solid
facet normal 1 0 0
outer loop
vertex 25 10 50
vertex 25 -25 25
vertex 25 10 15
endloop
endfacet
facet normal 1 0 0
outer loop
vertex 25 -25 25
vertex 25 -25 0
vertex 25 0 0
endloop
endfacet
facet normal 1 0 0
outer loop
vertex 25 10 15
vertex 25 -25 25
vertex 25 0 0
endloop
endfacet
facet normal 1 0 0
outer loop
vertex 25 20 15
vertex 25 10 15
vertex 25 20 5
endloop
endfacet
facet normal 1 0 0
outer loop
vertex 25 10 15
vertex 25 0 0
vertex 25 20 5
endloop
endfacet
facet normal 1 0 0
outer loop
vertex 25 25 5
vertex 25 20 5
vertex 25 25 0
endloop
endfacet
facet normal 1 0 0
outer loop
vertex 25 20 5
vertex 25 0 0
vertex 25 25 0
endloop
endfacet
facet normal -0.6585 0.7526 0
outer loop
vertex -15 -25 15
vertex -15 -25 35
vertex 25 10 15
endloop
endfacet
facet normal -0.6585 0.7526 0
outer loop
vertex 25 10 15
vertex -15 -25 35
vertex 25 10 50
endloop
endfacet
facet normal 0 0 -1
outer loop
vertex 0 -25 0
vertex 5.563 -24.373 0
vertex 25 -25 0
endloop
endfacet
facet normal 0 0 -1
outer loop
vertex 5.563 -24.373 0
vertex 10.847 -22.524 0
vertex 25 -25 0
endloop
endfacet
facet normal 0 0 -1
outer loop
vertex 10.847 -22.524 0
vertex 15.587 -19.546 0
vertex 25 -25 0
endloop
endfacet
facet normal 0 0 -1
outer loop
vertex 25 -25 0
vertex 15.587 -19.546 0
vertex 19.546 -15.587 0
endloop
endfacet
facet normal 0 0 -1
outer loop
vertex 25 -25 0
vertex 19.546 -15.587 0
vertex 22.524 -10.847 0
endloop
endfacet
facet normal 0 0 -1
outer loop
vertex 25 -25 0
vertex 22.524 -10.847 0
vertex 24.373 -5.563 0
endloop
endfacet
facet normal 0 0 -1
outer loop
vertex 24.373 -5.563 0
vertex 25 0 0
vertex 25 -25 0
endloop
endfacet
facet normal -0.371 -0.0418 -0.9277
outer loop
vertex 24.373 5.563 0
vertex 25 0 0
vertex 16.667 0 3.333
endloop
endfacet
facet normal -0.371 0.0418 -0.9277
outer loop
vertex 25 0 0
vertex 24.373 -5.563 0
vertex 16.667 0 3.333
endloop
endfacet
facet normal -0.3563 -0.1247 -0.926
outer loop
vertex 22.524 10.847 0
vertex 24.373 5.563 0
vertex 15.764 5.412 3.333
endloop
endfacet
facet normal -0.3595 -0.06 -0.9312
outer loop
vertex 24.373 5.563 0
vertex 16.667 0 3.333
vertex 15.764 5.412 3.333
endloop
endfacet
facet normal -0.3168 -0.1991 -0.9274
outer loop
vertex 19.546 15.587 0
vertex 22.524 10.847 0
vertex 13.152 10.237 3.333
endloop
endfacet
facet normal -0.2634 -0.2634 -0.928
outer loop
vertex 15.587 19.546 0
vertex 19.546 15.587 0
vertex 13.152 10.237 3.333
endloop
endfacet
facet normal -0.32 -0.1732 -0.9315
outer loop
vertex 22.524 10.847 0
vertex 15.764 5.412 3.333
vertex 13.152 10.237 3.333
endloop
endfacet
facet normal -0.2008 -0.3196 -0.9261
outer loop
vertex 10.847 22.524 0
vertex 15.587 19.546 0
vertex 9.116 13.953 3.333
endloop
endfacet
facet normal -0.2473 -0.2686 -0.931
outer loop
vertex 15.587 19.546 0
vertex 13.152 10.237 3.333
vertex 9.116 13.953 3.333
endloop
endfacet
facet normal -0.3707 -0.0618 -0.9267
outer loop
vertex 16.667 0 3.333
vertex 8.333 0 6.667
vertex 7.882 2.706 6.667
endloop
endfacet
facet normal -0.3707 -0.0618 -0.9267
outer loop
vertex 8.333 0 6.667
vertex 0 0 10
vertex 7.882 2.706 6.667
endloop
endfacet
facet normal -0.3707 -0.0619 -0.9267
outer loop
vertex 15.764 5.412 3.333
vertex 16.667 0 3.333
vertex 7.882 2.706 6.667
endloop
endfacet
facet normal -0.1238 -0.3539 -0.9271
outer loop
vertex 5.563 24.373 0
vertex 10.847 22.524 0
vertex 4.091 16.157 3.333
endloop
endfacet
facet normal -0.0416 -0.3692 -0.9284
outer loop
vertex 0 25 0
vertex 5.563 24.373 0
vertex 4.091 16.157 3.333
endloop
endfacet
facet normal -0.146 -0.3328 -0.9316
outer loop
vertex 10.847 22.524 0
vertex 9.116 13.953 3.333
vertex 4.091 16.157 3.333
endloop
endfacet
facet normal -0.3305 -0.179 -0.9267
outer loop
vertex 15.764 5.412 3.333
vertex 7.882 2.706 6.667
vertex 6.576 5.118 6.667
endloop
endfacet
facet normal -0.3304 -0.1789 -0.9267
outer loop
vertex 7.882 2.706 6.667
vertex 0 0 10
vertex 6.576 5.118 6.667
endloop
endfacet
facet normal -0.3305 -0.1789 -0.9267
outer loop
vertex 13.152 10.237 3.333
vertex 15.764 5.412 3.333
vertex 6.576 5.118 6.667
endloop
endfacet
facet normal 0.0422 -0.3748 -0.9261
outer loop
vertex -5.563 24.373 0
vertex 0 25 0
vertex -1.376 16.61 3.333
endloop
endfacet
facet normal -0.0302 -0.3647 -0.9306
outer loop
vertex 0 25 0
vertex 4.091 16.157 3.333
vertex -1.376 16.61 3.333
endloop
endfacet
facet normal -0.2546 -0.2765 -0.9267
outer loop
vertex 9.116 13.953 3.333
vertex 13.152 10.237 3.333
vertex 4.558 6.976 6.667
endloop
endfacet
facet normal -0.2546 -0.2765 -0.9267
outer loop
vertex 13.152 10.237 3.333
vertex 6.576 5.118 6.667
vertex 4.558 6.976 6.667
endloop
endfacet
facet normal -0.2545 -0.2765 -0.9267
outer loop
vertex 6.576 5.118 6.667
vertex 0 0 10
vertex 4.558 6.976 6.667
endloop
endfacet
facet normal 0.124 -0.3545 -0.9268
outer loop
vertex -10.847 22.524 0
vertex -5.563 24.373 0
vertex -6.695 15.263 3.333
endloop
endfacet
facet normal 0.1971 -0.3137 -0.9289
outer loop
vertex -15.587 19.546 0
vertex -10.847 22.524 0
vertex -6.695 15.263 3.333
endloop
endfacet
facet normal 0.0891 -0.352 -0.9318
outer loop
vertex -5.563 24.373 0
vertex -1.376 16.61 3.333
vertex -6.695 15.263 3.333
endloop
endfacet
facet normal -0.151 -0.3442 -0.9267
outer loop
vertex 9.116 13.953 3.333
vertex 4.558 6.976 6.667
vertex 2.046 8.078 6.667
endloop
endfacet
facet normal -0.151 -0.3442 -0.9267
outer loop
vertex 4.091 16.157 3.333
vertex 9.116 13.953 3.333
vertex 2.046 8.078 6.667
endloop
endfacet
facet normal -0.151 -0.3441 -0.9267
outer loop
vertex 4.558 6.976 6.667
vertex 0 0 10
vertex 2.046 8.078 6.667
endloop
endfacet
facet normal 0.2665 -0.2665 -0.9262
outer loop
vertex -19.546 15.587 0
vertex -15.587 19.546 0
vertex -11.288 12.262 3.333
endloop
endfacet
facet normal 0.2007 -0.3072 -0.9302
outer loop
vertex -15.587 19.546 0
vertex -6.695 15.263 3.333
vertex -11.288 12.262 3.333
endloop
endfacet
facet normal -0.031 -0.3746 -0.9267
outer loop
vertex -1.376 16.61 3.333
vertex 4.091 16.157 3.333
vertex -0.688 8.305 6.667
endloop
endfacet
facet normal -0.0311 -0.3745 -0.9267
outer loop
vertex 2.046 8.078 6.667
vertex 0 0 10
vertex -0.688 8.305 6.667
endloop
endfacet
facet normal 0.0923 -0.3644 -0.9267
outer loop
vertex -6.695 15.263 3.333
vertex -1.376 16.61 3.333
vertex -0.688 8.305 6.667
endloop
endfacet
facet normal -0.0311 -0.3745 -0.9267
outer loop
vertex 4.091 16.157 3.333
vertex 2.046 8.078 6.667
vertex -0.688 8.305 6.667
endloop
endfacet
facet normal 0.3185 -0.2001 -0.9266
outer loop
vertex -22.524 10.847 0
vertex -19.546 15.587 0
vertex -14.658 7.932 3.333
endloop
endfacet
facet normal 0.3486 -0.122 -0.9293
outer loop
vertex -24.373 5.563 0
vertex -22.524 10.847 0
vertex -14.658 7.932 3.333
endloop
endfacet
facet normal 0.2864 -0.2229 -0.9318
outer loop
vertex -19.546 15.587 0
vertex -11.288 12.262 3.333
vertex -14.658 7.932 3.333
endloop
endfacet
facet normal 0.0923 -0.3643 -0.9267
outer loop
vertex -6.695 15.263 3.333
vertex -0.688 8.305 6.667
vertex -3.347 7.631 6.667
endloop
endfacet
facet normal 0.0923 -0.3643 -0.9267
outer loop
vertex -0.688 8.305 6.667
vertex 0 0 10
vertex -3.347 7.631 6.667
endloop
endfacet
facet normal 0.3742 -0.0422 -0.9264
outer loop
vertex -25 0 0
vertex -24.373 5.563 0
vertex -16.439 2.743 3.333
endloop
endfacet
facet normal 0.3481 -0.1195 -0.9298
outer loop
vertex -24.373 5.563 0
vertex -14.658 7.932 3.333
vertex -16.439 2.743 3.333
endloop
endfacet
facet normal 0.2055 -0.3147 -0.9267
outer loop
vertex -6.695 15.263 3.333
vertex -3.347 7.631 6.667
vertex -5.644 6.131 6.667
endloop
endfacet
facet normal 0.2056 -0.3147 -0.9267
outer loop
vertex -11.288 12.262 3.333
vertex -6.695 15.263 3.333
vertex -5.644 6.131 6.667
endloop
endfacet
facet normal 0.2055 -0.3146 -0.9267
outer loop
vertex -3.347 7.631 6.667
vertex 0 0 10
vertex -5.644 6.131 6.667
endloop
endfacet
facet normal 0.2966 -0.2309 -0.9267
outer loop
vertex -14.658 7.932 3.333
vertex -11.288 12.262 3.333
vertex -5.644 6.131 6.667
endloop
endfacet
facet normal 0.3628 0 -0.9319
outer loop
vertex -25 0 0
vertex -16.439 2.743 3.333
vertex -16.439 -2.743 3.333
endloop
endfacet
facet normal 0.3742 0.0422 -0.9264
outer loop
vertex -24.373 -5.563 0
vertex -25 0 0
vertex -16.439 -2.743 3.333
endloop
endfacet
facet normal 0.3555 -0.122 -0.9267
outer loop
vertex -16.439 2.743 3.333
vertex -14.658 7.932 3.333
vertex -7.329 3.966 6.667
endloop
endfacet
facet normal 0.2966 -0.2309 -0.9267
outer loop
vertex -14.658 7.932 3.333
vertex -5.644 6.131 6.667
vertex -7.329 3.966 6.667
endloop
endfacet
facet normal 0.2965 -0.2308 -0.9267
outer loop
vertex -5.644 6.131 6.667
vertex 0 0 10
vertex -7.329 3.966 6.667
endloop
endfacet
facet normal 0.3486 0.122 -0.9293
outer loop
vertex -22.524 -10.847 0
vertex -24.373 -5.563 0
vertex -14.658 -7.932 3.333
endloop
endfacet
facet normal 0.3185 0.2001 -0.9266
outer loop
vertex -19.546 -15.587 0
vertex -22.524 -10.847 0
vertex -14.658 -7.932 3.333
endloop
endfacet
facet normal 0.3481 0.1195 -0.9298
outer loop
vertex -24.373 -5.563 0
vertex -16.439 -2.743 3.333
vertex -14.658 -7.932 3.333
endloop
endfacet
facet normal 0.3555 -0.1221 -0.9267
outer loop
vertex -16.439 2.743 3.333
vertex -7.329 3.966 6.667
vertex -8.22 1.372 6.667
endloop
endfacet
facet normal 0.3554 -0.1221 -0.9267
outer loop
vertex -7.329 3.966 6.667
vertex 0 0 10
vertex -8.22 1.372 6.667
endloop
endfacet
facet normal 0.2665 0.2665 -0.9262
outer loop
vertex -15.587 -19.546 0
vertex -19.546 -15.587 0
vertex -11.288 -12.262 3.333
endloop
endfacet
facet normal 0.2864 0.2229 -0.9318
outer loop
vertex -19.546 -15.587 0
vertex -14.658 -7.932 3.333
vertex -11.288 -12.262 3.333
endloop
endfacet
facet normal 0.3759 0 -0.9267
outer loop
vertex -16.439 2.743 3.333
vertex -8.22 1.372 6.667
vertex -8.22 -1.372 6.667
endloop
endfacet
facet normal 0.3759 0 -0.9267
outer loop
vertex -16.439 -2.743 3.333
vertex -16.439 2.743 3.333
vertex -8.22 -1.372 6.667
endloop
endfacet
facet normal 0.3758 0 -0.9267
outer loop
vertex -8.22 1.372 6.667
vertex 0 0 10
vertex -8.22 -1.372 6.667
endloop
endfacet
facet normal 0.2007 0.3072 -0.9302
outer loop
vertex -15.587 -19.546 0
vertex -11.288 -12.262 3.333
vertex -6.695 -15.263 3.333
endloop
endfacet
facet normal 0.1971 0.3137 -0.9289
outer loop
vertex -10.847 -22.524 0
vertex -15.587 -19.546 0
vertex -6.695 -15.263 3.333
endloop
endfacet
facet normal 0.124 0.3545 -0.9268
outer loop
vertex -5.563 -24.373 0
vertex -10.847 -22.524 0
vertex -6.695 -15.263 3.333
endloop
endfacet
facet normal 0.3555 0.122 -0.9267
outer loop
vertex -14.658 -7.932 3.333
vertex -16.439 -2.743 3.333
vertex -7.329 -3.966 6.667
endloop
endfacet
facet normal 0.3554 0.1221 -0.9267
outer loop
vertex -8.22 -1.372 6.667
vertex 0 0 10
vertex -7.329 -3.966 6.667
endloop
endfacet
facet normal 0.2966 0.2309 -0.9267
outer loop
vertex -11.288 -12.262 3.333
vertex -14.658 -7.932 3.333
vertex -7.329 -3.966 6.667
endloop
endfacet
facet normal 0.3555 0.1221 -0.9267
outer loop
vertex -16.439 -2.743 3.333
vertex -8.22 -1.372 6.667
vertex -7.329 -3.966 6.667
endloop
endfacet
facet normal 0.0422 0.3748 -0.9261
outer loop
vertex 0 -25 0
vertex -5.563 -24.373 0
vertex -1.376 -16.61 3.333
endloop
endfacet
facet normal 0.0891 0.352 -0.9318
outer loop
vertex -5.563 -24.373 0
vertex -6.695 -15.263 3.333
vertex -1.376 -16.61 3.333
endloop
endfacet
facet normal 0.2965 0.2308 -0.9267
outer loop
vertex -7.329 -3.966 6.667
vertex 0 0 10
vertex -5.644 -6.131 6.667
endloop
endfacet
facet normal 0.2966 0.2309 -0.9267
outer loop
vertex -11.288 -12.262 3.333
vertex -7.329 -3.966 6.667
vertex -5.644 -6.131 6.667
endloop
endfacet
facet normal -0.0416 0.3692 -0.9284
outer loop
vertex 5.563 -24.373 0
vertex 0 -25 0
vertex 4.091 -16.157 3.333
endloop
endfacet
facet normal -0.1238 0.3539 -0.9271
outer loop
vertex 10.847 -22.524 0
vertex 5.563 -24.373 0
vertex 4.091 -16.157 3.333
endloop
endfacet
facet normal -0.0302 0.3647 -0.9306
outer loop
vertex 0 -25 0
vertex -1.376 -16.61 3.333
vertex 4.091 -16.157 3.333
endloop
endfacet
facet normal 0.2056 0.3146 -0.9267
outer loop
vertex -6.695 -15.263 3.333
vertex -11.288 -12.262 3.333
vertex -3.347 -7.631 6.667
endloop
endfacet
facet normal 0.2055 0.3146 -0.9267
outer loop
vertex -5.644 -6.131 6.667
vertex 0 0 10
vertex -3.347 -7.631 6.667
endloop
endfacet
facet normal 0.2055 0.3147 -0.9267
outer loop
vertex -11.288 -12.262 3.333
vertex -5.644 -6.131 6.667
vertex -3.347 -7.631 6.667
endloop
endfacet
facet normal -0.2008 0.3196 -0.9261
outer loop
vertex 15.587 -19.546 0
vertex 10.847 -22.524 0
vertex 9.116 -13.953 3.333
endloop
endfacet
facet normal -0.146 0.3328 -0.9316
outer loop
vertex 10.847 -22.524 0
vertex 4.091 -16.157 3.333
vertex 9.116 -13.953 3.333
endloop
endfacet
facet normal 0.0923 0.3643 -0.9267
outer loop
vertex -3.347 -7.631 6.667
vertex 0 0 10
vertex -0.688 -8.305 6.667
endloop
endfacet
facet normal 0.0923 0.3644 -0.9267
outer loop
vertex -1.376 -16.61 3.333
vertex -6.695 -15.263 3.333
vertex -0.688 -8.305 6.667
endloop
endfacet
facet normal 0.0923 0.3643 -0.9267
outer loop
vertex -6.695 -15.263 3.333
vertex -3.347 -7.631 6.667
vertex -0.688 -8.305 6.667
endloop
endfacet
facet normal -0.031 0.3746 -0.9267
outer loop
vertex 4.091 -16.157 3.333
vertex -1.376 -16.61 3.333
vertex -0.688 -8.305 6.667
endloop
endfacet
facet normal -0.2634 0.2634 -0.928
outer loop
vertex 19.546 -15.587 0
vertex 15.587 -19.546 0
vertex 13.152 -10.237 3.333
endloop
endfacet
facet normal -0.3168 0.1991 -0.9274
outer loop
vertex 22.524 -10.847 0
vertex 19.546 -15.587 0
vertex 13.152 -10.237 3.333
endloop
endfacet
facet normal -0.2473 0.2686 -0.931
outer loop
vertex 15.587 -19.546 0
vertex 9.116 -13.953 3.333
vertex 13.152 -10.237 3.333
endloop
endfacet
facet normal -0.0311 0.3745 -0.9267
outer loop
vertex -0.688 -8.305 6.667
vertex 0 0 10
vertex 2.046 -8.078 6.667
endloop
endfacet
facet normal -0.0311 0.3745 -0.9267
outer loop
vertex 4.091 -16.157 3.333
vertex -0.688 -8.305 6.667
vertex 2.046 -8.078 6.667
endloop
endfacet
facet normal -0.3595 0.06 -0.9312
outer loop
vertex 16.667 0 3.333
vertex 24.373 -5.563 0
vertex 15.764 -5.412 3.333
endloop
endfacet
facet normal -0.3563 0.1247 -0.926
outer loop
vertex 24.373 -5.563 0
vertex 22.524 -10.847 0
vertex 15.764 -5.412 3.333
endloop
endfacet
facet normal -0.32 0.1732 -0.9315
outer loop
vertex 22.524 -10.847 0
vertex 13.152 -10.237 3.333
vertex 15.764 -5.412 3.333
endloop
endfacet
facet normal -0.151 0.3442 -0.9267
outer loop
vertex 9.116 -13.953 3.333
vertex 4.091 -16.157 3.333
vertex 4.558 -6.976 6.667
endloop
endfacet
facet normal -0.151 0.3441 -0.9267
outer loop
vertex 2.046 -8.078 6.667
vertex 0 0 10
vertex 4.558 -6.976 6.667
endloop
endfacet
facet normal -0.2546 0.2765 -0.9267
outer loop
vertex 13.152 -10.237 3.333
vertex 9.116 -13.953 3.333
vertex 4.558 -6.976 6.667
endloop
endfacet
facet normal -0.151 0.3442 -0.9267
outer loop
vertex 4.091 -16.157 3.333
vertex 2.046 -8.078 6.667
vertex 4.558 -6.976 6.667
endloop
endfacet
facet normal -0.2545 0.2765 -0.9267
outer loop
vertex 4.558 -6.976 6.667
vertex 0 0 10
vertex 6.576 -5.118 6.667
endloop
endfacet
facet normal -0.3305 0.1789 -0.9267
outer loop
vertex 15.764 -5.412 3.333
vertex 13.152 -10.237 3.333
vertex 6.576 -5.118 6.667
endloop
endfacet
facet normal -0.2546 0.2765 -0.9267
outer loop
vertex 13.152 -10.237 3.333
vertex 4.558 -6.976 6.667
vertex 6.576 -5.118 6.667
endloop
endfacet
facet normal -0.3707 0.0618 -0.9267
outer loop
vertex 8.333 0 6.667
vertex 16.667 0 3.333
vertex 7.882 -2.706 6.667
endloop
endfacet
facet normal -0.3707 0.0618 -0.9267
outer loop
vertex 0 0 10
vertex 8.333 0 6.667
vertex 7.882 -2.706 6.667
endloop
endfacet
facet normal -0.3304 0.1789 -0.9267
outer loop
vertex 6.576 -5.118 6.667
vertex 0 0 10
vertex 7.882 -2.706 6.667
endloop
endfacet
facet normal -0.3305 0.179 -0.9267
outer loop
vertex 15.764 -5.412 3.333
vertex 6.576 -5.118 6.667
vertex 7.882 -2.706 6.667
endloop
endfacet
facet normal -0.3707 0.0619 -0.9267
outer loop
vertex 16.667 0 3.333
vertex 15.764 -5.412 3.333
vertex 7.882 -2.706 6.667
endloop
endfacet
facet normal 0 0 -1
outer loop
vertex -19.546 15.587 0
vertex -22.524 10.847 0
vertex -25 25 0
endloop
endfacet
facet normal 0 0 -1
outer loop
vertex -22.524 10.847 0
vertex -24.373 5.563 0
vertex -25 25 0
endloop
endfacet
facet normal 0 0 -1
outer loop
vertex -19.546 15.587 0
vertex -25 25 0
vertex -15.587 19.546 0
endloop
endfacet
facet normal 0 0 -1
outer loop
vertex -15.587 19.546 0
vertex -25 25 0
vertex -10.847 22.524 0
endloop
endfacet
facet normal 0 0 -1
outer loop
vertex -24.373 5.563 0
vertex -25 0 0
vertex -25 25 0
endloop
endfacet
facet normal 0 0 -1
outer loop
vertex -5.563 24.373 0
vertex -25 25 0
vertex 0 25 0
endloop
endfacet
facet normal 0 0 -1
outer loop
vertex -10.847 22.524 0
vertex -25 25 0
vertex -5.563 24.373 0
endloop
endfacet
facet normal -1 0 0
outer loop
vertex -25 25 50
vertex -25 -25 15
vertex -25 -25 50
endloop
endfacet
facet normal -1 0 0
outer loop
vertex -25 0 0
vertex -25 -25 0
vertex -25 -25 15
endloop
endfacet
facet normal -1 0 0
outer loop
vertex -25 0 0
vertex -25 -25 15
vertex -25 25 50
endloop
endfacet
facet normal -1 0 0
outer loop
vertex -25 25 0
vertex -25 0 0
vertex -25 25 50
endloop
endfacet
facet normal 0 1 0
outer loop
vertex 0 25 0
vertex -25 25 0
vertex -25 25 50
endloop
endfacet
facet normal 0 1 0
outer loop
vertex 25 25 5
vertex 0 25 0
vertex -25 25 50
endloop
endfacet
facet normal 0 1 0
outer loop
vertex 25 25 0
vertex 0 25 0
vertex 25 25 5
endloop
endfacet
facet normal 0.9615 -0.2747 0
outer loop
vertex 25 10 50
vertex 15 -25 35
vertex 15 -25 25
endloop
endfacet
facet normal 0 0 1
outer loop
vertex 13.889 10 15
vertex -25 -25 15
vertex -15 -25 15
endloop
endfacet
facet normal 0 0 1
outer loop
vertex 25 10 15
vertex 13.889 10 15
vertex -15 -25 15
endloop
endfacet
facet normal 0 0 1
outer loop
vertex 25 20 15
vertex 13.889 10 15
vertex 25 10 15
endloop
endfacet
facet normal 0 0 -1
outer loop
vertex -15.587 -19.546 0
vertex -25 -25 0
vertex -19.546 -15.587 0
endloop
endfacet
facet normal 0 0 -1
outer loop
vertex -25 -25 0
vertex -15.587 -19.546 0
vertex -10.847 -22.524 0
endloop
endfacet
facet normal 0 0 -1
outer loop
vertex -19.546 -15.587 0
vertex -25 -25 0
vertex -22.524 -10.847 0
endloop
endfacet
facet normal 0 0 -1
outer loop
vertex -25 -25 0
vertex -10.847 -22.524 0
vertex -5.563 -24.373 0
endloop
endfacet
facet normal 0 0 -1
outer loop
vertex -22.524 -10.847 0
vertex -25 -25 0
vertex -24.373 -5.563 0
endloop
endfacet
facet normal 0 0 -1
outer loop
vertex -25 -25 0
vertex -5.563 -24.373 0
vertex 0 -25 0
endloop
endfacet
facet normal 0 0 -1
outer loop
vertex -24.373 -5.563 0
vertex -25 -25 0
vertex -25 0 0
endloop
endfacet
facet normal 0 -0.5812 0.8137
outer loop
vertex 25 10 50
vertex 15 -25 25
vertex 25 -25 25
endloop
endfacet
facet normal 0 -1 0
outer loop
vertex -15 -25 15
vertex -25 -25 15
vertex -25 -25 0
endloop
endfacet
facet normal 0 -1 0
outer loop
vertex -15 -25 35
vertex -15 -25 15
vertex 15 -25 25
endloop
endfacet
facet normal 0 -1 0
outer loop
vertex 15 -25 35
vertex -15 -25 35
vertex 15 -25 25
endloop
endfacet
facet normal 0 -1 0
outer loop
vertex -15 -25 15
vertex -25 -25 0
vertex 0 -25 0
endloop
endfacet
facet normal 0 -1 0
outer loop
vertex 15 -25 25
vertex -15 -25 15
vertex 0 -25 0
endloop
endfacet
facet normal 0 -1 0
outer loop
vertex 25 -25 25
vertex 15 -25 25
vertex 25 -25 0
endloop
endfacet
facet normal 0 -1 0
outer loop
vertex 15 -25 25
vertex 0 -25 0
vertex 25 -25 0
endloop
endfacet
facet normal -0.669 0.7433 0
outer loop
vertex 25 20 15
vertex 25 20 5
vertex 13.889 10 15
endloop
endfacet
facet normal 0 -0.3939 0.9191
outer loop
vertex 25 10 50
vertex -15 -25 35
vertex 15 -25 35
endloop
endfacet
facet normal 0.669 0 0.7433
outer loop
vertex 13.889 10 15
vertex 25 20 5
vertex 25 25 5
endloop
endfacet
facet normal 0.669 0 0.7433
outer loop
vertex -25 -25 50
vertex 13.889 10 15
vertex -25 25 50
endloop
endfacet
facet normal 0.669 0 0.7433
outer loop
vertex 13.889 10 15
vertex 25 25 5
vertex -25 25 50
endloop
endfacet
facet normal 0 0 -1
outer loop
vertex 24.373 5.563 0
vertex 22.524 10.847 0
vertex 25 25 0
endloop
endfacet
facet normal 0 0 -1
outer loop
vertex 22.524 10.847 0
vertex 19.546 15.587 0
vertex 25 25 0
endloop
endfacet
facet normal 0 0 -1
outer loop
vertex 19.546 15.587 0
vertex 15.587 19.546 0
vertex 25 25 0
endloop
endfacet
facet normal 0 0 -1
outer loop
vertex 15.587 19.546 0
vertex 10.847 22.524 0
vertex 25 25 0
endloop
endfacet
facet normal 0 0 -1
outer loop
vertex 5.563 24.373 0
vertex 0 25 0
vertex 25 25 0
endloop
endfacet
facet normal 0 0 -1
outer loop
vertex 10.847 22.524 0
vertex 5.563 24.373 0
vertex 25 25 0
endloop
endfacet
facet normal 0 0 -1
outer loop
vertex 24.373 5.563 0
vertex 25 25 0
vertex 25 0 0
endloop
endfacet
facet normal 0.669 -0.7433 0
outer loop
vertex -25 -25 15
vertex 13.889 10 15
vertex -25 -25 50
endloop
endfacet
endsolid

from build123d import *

# Parameters (mm, degrees)
F0_W      = 50
F0_H      = 50
F1_DEPTH  = 50
F4_DEPTH  = 35
F10_REACH = 117.2691203354


with BuildPart() as f1:
    # F0 (on Top) → F1 (new body)
    with BuildSketch(Plane.XY):
        Rectangle(F0_W, F0_H)
    extrude(amount=F1_DEPTH)

    # F3 (on face) → F4 (cut, through all)
    with BuildSketch(Plane.XY.offset(50)):
        Polygon((25, 20), (-25, -25), (-15, -25), (25, 10), align=None)
    extrude(amount=-F4_DEPTH, mode=Mode.SUBTRACT)

    # F5 (on Front) → F6 (revolve, cut)
    with BuildSketch(Plane.XZ):
        Polygon((0, 10), (0, 0), (25, 0), align=None)
    revolve(axis=Axis((0, 0, 5), (0, 0, 1)), mode=Mode.SUBTRACT)

    # F7 (on face) → F8 section 0
    with BuildSketch(Plane.XZ.offset(25), mode=Mode.PRIVATE) as f8_s0:
        Polygon((25, 50), (-15, 50), (-15, 35), (15, 35), (15, 25), (25, 25), align=None)
    loft([f8_s0.sketch, Vertex(25, 10, 50)], mode=Mode.SUBTRACT)

    f10_end = Plane(origin=(0, -2.5, 32.5), x_dir=(-0.7432941462, -0.6689647316, 0), z_dir=(0.6689647316, -0.7432941462, 0))
    # F9 (on face) → F10 (cut, up to a plane its end follows)
    with BuildSketch(Plane(origin=(0, 25, 0), x_dir=(-1, 0, 0), z_dir=(0, 1, 0))):
        Polygon((-25, 5), (25, 50), (-25, 50), align=None)
    f10_long = extrude(amount=-F10_REACH, mode=Mode.PRIVATE)
    add(split(f10_long, bisect_by=f10_end, keep=Keep.BOTTOM, mode=Mode.PRIVATE), mode=Mode.SUBTRACT)


solid = f1.part
